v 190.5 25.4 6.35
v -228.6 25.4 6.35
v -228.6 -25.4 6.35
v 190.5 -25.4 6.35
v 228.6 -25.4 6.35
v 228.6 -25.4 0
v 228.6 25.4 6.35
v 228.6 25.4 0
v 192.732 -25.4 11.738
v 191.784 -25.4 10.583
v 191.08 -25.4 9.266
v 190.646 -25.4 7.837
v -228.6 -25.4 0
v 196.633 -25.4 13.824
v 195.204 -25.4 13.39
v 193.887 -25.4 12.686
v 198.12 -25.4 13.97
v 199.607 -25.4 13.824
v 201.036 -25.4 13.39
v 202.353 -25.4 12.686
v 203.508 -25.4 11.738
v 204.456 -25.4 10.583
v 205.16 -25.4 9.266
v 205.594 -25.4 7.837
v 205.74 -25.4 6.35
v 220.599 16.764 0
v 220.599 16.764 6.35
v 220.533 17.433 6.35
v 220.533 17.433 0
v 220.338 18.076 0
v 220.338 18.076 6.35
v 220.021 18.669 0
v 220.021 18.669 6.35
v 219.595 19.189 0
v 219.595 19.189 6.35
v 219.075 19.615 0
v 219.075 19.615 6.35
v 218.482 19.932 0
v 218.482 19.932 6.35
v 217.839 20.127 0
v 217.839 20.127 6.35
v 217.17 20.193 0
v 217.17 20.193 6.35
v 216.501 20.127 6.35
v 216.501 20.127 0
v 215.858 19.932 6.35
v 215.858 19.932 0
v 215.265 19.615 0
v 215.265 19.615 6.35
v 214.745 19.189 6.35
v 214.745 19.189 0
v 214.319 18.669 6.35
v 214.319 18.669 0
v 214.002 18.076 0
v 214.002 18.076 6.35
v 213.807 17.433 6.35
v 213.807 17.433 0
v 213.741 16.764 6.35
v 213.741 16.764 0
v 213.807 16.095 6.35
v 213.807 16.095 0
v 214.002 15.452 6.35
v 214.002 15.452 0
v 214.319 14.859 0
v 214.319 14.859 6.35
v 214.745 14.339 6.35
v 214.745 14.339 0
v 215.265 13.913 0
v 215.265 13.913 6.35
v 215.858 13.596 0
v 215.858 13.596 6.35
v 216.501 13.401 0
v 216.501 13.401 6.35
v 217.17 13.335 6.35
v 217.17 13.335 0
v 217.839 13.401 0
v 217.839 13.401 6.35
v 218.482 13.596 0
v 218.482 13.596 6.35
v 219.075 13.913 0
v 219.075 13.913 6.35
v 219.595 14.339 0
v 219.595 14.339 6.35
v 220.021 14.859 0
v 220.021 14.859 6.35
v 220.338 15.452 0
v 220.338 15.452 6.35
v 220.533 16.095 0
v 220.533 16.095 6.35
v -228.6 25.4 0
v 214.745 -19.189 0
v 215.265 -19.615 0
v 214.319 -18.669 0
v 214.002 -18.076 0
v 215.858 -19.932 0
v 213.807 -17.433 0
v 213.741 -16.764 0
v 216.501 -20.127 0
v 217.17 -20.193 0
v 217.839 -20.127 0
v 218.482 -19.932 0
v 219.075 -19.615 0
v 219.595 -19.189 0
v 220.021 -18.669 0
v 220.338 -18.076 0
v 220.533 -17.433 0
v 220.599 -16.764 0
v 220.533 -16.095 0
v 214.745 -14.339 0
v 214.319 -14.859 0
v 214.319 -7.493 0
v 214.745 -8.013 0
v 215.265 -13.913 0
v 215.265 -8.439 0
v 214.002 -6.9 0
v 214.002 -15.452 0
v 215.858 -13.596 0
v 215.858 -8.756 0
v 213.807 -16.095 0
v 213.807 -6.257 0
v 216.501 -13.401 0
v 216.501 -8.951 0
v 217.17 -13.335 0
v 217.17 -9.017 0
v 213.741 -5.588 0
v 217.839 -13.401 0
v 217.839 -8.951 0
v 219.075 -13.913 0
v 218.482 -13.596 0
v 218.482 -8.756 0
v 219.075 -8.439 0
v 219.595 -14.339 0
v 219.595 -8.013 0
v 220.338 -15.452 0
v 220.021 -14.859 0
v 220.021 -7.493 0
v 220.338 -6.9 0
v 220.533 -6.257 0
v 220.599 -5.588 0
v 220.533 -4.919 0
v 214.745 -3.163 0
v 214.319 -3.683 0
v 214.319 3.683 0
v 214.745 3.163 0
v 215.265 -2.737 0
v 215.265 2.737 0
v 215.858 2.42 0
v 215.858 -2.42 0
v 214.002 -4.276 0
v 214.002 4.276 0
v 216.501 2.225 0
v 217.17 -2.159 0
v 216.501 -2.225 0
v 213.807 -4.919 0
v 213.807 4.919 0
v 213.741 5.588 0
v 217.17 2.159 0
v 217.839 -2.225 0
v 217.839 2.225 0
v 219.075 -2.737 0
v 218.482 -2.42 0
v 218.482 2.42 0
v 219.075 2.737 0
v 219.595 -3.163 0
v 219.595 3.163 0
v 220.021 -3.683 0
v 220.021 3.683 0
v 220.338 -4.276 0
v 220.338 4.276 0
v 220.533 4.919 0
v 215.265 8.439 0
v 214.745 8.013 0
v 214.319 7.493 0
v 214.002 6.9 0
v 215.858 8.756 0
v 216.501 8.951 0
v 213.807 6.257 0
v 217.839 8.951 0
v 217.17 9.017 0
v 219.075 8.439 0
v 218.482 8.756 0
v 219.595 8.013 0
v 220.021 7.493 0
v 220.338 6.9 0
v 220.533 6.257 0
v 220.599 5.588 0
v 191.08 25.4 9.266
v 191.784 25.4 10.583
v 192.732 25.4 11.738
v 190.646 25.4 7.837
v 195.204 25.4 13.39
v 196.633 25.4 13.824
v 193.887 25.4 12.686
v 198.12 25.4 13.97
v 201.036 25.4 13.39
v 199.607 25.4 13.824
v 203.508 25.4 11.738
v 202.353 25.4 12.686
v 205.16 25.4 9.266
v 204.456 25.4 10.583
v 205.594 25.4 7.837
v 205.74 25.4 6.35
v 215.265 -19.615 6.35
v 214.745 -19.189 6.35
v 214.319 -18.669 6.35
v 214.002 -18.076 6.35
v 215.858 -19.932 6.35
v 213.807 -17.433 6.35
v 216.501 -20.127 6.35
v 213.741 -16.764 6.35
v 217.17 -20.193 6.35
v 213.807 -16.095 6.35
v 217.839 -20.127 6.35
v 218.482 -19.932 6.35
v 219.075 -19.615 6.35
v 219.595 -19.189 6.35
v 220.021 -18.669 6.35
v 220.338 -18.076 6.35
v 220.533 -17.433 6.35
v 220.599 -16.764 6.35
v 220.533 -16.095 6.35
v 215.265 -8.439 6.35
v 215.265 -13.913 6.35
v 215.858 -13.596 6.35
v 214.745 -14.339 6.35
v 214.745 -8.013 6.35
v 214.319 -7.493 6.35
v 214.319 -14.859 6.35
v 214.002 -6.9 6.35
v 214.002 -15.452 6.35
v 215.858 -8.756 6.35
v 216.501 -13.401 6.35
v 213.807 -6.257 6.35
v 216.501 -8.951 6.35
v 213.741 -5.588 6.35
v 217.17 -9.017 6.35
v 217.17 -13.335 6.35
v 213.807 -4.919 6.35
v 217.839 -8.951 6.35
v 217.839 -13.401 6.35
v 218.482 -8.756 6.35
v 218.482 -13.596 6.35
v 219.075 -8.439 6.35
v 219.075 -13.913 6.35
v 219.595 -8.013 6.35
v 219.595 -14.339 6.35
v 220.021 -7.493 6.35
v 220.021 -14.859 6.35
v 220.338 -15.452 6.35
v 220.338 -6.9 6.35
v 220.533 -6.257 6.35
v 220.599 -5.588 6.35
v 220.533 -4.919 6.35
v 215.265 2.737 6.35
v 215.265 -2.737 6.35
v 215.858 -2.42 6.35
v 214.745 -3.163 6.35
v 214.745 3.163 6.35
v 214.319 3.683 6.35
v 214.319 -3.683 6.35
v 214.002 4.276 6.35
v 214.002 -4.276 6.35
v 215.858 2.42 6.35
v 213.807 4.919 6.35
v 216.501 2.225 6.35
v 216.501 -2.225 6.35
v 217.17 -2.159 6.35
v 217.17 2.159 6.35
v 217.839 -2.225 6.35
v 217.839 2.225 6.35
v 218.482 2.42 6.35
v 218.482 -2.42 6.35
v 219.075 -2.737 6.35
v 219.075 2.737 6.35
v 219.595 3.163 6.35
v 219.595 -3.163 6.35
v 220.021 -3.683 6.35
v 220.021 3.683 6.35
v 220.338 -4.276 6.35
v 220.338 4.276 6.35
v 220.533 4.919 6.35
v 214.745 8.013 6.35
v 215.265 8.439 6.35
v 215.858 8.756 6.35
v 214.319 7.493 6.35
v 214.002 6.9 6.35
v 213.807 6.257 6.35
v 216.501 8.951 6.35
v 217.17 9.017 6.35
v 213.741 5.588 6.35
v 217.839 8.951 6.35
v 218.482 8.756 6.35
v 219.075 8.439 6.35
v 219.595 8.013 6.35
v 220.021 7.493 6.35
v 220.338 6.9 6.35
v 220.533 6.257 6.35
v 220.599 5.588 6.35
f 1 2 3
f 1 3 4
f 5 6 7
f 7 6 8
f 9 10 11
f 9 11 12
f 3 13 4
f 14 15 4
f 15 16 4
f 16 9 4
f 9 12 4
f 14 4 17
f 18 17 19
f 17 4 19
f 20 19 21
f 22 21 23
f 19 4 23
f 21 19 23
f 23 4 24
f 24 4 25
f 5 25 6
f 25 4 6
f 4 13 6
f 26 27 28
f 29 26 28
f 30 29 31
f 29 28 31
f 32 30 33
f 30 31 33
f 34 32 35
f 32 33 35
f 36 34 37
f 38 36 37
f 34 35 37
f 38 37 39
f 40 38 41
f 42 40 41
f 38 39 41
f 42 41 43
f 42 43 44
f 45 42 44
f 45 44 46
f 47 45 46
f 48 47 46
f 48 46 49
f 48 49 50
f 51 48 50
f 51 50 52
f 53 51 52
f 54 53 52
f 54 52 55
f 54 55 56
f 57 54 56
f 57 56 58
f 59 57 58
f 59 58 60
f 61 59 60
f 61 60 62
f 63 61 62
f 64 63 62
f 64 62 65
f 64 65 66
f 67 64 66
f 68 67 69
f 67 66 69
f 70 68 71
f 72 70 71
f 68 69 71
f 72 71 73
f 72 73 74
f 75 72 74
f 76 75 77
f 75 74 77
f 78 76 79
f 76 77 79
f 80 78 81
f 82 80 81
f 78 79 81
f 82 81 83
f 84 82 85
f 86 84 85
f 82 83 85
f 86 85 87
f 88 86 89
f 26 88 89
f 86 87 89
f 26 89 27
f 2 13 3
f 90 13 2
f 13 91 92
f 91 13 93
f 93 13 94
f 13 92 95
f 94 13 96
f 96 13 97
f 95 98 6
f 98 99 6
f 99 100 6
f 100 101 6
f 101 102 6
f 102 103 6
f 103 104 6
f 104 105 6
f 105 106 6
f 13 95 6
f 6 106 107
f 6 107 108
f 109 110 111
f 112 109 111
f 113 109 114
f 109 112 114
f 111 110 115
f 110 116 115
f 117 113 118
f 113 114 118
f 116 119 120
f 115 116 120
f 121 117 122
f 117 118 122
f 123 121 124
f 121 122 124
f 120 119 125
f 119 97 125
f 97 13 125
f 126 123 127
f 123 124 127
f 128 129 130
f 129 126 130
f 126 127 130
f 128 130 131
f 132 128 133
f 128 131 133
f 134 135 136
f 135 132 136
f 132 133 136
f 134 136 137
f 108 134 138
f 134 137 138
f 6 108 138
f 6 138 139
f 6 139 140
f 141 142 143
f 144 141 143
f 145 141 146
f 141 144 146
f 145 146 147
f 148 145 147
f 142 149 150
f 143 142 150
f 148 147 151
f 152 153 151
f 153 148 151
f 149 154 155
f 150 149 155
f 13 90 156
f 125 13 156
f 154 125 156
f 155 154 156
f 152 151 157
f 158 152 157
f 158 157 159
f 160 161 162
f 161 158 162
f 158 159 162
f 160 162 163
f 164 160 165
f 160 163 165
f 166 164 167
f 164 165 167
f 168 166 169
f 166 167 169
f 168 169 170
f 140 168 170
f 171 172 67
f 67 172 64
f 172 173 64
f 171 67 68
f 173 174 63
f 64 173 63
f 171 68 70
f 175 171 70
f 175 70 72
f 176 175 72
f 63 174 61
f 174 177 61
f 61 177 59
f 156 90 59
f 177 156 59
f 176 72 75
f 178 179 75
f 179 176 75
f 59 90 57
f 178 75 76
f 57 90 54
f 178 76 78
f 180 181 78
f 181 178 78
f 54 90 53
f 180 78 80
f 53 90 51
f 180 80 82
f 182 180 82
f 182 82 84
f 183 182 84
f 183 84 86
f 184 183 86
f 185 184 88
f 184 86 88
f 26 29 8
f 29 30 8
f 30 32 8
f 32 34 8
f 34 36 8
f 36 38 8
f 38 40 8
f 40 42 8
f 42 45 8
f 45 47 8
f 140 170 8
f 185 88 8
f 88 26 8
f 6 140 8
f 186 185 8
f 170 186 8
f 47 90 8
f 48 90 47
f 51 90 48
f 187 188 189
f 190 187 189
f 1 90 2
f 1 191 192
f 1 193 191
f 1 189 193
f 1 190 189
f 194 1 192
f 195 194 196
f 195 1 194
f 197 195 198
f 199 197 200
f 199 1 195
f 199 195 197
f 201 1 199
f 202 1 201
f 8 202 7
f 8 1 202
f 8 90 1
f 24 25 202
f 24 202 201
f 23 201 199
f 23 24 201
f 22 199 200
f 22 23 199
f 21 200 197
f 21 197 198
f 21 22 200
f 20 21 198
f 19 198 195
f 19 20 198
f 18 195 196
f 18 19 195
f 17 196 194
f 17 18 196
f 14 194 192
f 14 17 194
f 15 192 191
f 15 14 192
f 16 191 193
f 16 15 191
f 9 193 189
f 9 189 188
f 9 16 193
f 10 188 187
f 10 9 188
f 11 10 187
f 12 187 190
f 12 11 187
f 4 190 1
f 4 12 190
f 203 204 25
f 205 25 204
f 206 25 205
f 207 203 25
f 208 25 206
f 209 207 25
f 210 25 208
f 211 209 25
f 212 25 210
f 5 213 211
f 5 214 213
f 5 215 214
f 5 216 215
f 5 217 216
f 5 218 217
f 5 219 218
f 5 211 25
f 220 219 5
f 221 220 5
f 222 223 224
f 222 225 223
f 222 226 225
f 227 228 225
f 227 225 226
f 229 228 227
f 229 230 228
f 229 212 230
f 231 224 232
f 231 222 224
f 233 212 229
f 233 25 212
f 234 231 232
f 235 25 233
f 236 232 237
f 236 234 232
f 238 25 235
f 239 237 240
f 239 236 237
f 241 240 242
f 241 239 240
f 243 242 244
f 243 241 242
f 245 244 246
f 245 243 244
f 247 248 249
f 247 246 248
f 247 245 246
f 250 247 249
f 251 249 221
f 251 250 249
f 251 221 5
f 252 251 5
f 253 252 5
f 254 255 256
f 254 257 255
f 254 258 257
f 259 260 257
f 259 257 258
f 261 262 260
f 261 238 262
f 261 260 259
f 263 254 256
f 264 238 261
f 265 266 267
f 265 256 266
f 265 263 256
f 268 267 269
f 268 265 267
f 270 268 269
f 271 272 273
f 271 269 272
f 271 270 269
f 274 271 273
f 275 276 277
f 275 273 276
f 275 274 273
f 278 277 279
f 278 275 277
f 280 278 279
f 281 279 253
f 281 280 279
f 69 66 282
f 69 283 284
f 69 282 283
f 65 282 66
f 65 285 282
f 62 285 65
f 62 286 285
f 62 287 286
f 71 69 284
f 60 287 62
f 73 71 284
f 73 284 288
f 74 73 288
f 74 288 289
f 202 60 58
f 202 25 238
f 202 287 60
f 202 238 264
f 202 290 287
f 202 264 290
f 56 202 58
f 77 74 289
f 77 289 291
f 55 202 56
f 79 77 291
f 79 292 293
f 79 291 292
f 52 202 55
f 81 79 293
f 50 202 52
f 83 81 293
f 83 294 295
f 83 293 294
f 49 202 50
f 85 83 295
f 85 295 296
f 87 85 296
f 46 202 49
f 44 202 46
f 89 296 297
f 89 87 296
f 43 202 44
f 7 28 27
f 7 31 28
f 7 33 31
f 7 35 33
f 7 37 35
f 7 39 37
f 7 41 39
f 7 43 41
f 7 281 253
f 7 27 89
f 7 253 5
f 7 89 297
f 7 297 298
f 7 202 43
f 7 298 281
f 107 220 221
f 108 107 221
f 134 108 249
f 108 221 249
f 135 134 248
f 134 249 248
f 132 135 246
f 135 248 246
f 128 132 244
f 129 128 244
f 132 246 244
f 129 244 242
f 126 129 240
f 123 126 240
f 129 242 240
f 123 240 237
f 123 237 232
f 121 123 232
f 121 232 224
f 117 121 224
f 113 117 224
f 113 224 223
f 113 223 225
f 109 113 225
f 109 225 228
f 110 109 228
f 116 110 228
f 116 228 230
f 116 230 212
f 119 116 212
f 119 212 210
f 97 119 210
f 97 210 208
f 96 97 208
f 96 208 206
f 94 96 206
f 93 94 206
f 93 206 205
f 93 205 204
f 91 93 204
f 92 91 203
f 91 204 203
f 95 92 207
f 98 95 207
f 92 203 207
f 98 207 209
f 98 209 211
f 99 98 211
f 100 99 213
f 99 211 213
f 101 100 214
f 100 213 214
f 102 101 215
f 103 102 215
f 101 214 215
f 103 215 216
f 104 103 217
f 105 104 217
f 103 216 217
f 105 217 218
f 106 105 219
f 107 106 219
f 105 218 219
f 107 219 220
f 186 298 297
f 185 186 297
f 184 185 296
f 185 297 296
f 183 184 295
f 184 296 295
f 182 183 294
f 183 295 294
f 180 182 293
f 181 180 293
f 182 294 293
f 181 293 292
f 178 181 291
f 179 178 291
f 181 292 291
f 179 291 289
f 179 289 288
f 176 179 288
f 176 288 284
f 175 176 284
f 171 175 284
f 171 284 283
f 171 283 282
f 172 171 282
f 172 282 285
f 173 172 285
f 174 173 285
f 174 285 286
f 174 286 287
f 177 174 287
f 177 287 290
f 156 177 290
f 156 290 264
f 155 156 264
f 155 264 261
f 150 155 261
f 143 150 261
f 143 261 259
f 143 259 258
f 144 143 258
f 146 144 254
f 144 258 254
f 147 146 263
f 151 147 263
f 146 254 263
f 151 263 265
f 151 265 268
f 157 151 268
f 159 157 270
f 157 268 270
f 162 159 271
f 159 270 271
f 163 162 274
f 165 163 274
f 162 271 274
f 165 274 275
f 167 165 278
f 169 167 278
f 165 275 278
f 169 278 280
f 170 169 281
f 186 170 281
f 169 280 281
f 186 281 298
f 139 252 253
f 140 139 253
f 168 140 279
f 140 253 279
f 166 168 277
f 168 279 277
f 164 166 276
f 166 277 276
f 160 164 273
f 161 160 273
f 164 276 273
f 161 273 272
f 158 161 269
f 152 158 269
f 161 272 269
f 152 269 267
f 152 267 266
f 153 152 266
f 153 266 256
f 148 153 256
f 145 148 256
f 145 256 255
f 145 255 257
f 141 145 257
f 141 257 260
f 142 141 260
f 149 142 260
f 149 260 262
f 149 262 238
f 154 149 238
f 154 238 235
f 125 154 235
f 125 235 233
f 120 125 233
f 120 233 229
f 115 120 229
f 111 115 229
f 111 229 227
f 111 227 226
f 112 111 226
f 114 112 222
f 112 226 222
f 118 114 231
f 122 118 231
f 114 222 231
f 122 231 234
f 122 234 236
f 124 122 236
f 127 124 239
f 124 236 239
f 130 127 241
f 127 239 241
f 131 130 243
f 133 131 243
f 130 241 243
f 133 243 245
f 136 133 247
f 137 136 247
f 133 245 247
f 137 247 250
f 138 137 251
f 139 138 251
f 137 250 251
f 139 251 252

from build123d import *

# Parameters (mm, degrees)
F0_W     = 457.2
F0_H     = 50.8
F1_DEPTH = 6.35
F3_DEPTH = 50.8
F4_R     = 3.429
F5_DEPTH = 25.4


with BuildPart() as f1:
    # F0 (on Top) → F1 (new body)
    with BuildSketch(Plane.XY):
        Rectangle(F0_W, F0_H)
    extrude(amount=F1_DEPTH)

    # F2 (on face) → F3 (join)
    with BuildSketch(Plane.XZ.offset(25.4)):
        with BuildLine():
            Line((190.5, 6.35), (205.74, 6.35))
            ThreePointArc((205.74, 6.35), (198.12, 13.97), (190.5, 6.35))
        make_face()
    extrude(amount=-F3_DEPTH)

    # F4 (on face) → F5 (cut)
    with BuildSketch(Plane.XY.offset(6.35)):
        with Locations((217.17, -16.764)):
            Circle(F4_R)
        with Locations((217.17, -5.588)):
            Circle(F4_R)
        with Locations((217.17, 5.588)):
            Circle(F4_R)
        with Locations((217.17, 16.764)):
            Circle(F4_R)
    extrude(amount=-F5_DEPTH, mode=Mode.SUBTRACT)


solid = f1.part
